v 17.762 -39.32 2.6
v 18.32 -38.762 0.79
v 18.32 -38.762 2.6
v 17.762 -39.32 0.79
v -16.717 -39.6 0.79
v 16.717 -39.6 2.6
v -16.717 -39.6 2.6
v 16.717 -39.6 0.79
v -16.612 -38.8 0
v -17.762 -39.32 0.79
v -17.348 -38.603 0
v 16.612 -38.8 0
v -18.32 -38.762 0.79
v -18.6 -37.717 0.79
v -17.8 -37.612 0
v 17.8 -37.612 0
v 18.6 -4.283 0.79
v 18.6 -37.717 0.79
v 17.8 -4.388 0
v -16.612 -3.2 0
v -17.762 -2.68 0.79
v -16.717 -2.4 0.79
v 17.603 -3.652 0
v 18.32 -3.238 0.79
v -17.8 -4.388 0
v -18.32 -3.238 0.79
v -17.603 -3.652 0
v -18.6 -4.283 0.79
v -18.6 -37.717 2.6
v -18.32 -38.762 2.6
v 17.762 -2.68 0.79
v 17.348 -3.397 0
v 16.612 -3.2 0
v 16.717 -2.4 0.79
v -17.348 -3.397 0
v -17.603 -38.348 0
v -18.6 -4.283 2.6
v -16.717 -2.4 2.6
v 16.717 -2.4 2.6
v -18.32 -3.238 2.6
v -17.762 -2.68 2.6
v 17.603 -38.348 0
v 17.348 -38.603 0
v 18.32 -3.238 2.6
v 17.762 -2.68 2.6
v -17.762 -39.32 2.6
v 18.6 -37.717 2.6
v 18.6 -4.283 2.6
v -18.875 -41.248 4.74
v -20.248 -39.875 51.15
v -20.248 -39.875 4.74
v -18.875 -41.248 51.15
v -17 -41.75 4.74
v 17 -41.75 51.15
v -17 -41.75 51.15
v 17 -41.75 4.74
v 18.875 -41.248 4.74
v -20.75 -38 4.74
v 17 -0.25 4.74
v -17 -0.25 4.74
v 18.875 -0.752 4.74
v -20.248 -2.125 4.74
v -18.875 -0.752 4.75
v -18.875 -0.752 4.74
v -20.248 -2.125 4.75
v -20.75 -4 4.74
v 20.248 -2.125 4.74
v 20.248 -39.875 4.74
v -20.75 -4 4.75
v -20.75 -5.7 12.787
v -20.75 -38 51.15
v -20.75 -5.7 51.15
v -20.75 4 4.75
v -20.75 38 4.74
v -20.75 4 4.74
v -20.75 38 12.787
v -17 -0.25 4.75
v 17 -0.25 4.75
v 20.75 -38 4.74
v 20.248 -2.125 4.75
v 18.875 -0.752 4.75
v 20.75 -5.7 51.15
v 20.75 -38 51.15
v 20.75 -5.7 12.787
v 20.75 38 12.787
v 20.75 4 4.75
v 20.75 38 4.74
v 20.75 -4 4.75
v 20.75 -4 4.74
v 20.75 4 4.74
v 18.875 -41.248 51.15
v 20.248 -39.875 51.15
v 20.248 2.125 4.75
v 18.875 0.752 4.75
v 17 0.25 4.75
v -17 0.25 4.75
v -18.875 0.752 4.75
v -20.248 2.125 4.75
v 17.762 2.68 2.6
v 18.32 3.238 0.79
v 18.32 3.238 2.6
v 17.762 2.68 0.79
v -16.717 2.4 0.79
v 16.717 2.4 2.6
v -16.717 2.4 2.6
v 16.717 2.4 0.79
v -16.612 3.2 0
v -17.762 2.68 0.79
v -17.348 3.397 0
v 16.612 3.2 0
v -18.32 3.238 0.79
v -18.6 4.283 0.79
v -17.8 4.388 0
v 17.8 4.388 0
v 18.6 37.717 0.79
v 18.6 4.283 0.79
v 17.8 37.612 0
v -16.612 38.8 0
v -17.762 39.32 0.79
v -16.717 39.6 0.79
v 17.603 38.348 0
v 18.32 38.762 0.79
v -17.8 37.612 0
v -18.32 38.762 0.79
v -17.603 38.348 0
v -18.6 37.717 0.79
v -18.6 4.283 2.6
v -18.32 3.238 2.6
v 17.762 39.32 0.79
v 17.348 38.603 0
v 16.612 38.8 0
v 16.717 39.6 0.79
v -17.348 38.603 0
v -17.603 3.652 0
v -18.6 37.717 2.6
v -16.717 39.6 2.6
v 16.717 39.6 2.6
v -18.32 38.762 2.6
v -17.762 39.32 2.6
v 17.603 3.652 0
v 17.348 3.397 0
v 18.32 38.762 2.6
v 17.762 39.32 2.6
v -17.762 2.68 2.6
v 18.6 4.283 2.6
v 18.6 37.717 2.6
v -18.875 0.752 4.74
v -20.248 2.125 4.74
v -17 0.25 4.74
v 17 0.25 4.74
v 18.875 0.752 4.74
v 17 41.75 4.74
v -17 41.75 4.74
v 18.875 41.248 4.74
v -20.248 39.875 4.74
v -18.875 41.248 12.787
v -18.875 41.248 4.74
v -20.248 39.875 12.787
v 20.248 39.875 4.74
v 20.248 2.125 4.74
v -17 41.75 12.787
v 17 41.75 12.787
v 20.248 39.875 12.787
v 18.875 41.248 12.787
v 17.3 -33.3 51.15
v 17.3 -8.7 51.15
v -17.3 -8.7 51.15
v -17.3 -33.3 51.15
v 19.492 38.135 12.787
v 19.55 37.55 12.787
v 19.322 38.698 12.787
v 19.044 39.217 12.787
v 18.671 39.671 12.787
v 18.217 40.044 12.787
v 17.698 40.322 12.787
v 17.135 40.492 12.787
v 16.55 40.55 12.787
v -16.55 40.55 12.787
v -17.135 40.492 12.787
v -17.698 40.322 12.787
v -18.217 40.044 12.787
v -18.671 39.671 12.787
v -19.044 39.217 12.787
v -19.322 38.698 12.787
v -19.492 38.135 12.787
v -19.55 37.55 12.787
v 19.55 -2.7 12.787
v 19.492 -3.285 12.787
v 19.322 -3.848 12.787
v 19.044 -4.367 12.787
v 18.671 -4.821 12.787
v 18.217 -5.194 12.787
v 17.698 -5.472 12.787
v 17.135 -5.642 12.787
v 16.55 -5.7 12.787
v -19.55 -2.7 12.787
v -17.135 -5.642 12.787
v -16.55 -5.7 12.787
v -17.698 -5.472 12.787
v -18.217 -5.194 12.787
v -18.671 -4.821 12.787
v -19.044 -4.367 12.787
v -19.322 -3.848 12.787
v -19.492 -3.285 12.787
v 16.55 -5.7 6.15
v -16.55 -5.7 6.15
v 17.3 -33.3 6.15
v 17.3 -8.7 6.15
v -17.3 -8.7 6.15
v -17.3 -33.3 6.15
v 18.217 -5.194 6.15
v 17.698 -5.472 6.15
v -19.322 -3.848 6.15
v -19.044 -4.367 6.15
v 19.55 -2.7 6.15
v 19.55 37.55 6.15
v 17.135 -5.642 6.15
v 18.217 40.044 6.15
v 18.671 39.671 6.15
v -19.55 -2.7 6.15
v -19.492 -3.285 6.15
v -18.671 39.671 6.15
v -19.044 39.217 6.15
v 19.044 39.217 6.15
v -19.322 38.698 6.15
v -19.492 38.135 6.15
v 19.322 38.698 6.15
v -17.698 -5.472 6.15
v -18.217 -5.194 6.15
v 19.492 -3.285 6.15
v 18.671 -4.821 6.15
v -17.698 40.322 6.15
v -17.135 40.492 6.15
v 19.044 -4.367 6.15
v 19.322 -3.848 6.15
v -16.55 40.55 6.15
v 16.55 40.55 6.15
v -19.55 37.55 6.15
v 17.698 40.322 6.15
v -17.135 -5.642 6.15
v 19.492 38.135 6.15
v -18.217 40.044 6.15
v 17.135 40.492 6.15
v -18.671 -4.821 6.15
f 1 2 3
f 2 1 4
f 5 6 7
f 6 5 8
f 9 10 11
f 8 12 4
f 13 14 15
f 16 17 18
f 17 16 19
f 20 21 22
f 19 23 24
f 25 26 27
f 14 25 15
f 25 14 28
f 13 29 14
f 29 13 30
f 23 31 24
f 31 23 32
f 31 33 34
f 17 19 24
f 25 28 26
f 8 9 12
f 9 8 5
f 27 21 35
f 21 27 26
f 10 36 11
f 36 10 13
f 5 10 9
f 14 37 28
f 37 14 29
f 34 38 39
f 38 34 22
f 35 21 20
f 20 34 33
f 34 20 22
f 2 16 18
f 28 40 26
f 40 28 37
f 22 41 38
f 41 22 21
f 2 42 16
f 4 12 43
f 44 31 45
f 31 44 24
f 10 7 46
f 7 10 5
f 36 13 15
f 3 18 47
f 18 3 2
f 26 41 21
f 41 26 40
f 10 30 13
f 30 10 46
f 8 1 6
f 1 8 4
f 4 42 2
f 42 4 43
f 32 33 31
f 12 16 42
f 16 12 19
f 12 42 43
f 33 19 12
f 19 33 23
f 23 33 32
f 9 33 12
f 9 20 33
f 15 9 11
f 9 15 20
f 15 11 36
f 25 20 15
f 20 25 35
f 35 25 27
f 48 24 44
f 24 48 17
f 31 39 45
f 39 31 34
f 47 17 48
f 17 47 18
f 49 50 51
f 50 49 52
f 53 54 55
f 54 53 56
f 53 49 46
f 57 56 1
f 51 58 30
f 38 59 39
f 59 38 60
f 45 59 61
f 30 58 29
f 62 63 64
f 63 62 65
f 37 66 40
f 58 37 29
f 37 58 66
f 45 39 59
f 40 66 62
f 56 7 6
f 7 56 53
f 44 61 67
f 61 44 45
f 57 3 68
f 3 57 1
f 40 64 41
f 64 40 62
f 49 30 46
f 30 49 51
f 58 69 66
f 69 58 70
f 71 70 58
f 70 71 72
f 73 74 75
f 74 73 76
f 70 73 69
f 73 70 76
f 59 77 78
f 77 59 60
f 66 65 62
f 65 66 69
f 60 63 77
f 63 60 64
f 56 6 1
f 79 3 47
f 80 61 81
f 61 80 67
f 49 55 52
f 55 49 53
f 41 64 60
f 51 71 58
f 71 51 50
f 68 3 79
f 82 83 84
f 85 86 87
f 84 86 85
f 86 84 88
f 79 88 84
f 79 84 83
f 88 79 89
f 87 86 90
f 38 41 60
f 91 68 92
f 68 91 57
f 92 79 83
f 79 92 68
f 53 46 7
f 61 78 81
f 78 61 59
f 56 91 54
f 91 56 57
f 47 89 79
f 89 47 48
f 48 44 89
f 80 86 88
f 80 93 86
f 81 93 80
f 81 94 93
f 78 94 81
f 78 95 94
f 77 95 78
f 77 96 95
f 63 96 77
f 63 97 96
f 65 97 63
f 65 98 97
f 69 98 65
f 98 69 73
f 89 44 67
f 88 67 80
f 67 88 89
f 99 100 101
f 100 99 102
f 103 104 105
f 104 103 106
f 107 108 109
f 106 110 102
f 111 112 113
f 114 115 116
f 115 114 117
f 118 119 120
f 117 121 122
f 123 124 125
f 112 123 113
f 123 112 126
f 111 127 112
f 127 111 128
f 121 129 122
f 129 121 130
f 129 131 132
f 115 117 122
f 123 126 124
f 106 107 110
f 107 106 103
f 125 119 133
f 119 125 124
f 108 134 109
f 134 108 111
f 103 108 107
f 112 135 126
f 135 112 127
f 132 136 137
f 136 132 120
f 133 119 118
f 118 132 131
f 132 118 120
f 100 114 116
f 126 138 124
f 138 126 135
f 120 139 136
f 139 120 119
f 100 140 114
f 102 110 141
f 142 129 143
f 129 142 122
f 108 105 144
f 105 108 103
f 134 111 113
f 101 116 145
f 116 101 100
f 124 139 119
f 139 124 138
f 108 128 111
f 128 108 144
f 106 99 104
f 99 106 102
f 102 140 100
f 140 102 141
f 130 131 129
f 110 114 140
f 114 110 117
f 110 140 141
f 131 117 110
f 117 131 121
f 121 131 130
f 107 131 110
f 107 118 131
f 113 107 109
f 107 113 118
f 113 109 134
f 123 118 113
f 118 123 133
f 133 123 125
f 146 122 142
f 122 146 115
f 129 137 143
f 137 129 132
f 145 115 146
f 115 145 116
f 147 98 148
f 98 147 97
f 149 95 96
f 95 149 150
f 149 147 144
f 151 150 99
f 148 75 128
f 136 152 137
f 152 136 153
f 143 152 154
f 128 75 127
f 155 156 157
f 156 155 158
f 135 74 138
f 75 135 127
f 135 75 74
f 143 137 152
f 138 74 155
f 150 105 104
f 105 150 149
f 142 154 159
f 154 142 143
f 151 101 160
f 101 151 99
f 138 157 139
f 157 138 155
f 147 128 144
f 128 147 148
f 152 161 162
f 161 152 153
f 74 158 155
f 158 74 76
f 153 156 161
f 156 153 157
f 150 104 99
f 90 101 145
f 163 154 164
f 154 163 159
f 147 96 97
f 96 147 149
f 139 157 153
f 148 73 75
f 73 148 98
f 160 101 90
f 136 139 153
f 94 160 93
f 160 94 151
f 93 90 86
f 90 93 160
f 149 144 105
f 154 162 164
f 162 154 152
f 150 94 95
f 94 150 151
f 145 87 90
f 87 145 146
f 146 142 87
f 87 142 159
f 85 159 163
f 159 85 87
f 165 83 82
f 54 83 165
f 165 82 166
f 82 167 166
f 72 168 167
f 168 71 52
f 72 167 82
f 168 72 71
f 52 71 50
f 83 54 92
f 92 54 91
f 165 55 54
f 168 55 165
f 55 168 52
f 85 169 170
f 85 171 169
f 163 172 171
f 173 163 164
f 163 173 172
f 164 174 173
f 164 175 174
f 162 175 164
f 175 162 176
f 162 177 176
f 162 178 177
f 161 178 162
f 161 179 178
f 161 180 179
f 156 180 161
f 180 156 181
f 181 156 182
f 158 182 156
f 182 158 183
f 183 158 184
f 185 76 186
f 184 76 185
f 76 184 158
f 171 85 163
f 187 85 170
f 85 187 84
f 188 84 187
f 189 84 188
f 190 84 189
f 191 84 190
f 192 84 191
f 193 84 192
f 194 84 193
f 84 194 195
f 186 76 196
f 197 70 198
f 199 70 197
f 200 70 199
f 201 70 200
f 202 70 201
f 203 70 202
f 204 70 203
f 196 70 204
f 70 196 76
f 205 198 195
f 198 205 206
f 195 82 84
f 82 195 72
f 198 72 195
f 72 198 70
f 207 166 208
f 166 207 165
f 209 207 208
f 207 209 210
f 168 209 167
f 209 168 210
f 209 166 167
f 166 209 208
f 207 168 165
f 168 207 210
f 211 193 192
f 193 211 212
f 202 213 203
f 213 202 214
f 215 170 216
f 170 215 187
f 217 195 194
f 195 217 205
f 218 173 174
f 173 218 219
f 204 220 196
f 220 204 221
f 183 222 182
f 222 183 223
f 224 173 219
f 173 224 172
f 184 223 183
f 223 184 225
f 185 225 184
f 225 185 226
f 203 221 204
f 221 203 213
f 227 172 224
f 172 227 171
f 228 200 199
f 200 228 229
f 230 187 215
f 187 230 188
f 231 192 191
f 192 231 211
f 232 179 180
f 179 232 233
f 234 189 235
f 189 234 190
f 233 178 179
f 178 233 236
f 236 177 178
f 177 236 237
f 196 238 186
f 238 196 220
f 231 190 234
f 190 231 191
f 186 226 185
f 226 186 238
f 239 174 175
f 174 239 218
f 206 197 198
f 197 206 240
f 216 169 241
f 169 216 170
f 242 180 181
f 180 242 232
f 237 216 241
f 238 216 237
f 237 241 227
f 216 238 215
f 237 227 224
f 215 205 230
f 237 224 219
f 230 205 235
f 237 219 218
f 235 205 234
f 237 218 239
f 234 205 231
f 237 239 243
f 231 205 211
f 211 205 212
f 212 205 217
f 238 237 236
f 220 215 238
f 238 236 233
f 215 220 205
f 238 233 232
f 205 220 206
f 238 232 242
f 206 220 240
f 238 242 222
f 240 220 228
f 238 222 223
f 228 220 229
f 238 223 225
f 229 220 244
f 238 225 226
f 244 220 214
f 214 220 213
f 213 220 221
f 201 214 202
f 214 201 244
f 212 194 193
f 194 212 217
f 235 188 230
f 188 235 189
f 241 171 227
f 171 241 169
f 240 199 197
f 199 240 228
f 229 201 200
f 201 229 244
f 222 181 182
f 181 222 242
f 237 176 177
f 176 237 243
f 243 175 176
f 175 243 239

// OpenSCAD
// bin_chip_vacuum — 1×2: one cell stands the handheld chip-puller vacuum upright,
// bottom end down; the other is a LOW tray — a quarter of the vacuum side's height —
// for its spare tip and suction cups, so the tool and its bits lift out together.
//
// MEASURED (survey/MEASUREMENTS.md, user's calipers, 2026-10-09):
//   34 × 24 × 170 mm with its tip on; rectangular, slightly rounded corners;
//   the bottom end is the
//   largest part and goes into the cup. The charge port is on that bottom face
//   and it will not charge in the holder, so the floor is closed.
//   Its spare tip and suction cups go in the open well (user, 2026-10-09 — the
//   well needs no measurements: it is a plain compartment, not a fit).
//
// A SQUARE-CORNERED POCKET FOR A ROUND-CORNERED BODY. The vacuum is rectangular
// with slightly rounded corners, so a pocket drawn with square corners leaves its
// corners clear and the four flats do the locating — the retain-on-the-flats
// rule. (A sharp-cornered body would have needed relief cuts; this one doesn't.)
//
// CAPTURE IS A COMFORT CHOICE, NOT A DERIVED NUMBER, the same call as the rotary
// tool cup: the bin latches into the grid, so nothing tips. 45 mm of a 170 mm
// body with 0.6 mm of clearance leans it under a degree and leaves plenty to grab.
//
// PRINT: as emitted, feet down. No supports.
//
// SPDX-License-Identifier: CC-BY-NC-4.0
// Copyright (c) 2026 Aaron Cupp

include <../lib/gridfinity.scad>

/* [Vacuum — measured] */
VAC_W = 34.0;      // bottom end, the largest part
VAC_D = 24.0;

/* [Bin] */
NX = 1; NY = 2;
CLR      = 0.6;    // on each dimension — this design's choice
CAPTURE  = 45;     // [30:1:80] how much of the body sits in the cup
FLOOR    = 1.4;
WALL     = 1.2;
DIVIDER  = 3.0;    // between the vacuum pocket and the well
LOW_FRAC = 0.25;   // the parts side stands this fraction of the vacuum side's height (user, 2026-10-09)
WELL_R   = 3;      // well corner radius

POCKET_W = VAC_W + CLR;            // along X, the 1-cell width
POCKET_D = VAC_D + CLR;            // along Y
H   = BIN_BASE_H + FLOOR + CAPTURE;
W   = NX*GF - 0.5;  D = NY*GF - 0.5;
POCKET_Y = -GF/2;                   // centred in the -Y cell
WELL_Y0  = POCKET_Y + POCKET_D/2 + DIVIDER;   // also where the tall part ends
H_LOW    = H * LOW_FRAC;
WELL_DEPTH = H_LOW - BIN_BASE_H - FLOOR;
WELL_Y1  = D/2 - WALL;
WELL_W   = W - 2*WALL;

assert(POCKET_W < W - 2*WALL, "Pocket breaks the side walls.");
assert(POCKET_Y - POCKET_D/2 > -D/2 + WALL, "Pocket breaks the end wall.");
assert(WELL_Y1 - WELL_Y0 > 25, "Well too short to be useful.");
assert(WELL_DEPTH >= 5, "Parts tray under 5 mm deep — raise LOW_FRAC.");
echo(str("bin ", W, " × ", D, " × ", H, "; pocket ", POCKET_W, " × ", POCKET_D, " × ", CAPTURE,
         "; parts side ", H_LOW, " tall, tray ", WELL_W, " × ", WELL_Y1 - WELL_Y0, " × ", WELL_DEPTH, " deep"));

difference() {
    bin_blank(NX, NY, H);
    // step the parts side down to H_LOW; the tall part ends at the divider
    translate([-W, WELL_Y0, H_LOW]) cube([2*W, D, H]);
    translate([-POCKET_W/2, POCKET_Y - POCKET_D/2, BIN_BASE_H + FLOOR]) cube([POCKET_W, POCKET_D, CAPTURE + 1]);
    translate([0, (WELL_Y0 + WELL_Y1)/2, H_LOW - WELL_DEPTH])
        linear_extrude(WELL_DEPTH + 1) offset(r = WELL_R, $fn = 32) offset(delta = -WELL_R)
            square([WELL_W, WELL_Y1 - WELL_Y0], center = true);
}
